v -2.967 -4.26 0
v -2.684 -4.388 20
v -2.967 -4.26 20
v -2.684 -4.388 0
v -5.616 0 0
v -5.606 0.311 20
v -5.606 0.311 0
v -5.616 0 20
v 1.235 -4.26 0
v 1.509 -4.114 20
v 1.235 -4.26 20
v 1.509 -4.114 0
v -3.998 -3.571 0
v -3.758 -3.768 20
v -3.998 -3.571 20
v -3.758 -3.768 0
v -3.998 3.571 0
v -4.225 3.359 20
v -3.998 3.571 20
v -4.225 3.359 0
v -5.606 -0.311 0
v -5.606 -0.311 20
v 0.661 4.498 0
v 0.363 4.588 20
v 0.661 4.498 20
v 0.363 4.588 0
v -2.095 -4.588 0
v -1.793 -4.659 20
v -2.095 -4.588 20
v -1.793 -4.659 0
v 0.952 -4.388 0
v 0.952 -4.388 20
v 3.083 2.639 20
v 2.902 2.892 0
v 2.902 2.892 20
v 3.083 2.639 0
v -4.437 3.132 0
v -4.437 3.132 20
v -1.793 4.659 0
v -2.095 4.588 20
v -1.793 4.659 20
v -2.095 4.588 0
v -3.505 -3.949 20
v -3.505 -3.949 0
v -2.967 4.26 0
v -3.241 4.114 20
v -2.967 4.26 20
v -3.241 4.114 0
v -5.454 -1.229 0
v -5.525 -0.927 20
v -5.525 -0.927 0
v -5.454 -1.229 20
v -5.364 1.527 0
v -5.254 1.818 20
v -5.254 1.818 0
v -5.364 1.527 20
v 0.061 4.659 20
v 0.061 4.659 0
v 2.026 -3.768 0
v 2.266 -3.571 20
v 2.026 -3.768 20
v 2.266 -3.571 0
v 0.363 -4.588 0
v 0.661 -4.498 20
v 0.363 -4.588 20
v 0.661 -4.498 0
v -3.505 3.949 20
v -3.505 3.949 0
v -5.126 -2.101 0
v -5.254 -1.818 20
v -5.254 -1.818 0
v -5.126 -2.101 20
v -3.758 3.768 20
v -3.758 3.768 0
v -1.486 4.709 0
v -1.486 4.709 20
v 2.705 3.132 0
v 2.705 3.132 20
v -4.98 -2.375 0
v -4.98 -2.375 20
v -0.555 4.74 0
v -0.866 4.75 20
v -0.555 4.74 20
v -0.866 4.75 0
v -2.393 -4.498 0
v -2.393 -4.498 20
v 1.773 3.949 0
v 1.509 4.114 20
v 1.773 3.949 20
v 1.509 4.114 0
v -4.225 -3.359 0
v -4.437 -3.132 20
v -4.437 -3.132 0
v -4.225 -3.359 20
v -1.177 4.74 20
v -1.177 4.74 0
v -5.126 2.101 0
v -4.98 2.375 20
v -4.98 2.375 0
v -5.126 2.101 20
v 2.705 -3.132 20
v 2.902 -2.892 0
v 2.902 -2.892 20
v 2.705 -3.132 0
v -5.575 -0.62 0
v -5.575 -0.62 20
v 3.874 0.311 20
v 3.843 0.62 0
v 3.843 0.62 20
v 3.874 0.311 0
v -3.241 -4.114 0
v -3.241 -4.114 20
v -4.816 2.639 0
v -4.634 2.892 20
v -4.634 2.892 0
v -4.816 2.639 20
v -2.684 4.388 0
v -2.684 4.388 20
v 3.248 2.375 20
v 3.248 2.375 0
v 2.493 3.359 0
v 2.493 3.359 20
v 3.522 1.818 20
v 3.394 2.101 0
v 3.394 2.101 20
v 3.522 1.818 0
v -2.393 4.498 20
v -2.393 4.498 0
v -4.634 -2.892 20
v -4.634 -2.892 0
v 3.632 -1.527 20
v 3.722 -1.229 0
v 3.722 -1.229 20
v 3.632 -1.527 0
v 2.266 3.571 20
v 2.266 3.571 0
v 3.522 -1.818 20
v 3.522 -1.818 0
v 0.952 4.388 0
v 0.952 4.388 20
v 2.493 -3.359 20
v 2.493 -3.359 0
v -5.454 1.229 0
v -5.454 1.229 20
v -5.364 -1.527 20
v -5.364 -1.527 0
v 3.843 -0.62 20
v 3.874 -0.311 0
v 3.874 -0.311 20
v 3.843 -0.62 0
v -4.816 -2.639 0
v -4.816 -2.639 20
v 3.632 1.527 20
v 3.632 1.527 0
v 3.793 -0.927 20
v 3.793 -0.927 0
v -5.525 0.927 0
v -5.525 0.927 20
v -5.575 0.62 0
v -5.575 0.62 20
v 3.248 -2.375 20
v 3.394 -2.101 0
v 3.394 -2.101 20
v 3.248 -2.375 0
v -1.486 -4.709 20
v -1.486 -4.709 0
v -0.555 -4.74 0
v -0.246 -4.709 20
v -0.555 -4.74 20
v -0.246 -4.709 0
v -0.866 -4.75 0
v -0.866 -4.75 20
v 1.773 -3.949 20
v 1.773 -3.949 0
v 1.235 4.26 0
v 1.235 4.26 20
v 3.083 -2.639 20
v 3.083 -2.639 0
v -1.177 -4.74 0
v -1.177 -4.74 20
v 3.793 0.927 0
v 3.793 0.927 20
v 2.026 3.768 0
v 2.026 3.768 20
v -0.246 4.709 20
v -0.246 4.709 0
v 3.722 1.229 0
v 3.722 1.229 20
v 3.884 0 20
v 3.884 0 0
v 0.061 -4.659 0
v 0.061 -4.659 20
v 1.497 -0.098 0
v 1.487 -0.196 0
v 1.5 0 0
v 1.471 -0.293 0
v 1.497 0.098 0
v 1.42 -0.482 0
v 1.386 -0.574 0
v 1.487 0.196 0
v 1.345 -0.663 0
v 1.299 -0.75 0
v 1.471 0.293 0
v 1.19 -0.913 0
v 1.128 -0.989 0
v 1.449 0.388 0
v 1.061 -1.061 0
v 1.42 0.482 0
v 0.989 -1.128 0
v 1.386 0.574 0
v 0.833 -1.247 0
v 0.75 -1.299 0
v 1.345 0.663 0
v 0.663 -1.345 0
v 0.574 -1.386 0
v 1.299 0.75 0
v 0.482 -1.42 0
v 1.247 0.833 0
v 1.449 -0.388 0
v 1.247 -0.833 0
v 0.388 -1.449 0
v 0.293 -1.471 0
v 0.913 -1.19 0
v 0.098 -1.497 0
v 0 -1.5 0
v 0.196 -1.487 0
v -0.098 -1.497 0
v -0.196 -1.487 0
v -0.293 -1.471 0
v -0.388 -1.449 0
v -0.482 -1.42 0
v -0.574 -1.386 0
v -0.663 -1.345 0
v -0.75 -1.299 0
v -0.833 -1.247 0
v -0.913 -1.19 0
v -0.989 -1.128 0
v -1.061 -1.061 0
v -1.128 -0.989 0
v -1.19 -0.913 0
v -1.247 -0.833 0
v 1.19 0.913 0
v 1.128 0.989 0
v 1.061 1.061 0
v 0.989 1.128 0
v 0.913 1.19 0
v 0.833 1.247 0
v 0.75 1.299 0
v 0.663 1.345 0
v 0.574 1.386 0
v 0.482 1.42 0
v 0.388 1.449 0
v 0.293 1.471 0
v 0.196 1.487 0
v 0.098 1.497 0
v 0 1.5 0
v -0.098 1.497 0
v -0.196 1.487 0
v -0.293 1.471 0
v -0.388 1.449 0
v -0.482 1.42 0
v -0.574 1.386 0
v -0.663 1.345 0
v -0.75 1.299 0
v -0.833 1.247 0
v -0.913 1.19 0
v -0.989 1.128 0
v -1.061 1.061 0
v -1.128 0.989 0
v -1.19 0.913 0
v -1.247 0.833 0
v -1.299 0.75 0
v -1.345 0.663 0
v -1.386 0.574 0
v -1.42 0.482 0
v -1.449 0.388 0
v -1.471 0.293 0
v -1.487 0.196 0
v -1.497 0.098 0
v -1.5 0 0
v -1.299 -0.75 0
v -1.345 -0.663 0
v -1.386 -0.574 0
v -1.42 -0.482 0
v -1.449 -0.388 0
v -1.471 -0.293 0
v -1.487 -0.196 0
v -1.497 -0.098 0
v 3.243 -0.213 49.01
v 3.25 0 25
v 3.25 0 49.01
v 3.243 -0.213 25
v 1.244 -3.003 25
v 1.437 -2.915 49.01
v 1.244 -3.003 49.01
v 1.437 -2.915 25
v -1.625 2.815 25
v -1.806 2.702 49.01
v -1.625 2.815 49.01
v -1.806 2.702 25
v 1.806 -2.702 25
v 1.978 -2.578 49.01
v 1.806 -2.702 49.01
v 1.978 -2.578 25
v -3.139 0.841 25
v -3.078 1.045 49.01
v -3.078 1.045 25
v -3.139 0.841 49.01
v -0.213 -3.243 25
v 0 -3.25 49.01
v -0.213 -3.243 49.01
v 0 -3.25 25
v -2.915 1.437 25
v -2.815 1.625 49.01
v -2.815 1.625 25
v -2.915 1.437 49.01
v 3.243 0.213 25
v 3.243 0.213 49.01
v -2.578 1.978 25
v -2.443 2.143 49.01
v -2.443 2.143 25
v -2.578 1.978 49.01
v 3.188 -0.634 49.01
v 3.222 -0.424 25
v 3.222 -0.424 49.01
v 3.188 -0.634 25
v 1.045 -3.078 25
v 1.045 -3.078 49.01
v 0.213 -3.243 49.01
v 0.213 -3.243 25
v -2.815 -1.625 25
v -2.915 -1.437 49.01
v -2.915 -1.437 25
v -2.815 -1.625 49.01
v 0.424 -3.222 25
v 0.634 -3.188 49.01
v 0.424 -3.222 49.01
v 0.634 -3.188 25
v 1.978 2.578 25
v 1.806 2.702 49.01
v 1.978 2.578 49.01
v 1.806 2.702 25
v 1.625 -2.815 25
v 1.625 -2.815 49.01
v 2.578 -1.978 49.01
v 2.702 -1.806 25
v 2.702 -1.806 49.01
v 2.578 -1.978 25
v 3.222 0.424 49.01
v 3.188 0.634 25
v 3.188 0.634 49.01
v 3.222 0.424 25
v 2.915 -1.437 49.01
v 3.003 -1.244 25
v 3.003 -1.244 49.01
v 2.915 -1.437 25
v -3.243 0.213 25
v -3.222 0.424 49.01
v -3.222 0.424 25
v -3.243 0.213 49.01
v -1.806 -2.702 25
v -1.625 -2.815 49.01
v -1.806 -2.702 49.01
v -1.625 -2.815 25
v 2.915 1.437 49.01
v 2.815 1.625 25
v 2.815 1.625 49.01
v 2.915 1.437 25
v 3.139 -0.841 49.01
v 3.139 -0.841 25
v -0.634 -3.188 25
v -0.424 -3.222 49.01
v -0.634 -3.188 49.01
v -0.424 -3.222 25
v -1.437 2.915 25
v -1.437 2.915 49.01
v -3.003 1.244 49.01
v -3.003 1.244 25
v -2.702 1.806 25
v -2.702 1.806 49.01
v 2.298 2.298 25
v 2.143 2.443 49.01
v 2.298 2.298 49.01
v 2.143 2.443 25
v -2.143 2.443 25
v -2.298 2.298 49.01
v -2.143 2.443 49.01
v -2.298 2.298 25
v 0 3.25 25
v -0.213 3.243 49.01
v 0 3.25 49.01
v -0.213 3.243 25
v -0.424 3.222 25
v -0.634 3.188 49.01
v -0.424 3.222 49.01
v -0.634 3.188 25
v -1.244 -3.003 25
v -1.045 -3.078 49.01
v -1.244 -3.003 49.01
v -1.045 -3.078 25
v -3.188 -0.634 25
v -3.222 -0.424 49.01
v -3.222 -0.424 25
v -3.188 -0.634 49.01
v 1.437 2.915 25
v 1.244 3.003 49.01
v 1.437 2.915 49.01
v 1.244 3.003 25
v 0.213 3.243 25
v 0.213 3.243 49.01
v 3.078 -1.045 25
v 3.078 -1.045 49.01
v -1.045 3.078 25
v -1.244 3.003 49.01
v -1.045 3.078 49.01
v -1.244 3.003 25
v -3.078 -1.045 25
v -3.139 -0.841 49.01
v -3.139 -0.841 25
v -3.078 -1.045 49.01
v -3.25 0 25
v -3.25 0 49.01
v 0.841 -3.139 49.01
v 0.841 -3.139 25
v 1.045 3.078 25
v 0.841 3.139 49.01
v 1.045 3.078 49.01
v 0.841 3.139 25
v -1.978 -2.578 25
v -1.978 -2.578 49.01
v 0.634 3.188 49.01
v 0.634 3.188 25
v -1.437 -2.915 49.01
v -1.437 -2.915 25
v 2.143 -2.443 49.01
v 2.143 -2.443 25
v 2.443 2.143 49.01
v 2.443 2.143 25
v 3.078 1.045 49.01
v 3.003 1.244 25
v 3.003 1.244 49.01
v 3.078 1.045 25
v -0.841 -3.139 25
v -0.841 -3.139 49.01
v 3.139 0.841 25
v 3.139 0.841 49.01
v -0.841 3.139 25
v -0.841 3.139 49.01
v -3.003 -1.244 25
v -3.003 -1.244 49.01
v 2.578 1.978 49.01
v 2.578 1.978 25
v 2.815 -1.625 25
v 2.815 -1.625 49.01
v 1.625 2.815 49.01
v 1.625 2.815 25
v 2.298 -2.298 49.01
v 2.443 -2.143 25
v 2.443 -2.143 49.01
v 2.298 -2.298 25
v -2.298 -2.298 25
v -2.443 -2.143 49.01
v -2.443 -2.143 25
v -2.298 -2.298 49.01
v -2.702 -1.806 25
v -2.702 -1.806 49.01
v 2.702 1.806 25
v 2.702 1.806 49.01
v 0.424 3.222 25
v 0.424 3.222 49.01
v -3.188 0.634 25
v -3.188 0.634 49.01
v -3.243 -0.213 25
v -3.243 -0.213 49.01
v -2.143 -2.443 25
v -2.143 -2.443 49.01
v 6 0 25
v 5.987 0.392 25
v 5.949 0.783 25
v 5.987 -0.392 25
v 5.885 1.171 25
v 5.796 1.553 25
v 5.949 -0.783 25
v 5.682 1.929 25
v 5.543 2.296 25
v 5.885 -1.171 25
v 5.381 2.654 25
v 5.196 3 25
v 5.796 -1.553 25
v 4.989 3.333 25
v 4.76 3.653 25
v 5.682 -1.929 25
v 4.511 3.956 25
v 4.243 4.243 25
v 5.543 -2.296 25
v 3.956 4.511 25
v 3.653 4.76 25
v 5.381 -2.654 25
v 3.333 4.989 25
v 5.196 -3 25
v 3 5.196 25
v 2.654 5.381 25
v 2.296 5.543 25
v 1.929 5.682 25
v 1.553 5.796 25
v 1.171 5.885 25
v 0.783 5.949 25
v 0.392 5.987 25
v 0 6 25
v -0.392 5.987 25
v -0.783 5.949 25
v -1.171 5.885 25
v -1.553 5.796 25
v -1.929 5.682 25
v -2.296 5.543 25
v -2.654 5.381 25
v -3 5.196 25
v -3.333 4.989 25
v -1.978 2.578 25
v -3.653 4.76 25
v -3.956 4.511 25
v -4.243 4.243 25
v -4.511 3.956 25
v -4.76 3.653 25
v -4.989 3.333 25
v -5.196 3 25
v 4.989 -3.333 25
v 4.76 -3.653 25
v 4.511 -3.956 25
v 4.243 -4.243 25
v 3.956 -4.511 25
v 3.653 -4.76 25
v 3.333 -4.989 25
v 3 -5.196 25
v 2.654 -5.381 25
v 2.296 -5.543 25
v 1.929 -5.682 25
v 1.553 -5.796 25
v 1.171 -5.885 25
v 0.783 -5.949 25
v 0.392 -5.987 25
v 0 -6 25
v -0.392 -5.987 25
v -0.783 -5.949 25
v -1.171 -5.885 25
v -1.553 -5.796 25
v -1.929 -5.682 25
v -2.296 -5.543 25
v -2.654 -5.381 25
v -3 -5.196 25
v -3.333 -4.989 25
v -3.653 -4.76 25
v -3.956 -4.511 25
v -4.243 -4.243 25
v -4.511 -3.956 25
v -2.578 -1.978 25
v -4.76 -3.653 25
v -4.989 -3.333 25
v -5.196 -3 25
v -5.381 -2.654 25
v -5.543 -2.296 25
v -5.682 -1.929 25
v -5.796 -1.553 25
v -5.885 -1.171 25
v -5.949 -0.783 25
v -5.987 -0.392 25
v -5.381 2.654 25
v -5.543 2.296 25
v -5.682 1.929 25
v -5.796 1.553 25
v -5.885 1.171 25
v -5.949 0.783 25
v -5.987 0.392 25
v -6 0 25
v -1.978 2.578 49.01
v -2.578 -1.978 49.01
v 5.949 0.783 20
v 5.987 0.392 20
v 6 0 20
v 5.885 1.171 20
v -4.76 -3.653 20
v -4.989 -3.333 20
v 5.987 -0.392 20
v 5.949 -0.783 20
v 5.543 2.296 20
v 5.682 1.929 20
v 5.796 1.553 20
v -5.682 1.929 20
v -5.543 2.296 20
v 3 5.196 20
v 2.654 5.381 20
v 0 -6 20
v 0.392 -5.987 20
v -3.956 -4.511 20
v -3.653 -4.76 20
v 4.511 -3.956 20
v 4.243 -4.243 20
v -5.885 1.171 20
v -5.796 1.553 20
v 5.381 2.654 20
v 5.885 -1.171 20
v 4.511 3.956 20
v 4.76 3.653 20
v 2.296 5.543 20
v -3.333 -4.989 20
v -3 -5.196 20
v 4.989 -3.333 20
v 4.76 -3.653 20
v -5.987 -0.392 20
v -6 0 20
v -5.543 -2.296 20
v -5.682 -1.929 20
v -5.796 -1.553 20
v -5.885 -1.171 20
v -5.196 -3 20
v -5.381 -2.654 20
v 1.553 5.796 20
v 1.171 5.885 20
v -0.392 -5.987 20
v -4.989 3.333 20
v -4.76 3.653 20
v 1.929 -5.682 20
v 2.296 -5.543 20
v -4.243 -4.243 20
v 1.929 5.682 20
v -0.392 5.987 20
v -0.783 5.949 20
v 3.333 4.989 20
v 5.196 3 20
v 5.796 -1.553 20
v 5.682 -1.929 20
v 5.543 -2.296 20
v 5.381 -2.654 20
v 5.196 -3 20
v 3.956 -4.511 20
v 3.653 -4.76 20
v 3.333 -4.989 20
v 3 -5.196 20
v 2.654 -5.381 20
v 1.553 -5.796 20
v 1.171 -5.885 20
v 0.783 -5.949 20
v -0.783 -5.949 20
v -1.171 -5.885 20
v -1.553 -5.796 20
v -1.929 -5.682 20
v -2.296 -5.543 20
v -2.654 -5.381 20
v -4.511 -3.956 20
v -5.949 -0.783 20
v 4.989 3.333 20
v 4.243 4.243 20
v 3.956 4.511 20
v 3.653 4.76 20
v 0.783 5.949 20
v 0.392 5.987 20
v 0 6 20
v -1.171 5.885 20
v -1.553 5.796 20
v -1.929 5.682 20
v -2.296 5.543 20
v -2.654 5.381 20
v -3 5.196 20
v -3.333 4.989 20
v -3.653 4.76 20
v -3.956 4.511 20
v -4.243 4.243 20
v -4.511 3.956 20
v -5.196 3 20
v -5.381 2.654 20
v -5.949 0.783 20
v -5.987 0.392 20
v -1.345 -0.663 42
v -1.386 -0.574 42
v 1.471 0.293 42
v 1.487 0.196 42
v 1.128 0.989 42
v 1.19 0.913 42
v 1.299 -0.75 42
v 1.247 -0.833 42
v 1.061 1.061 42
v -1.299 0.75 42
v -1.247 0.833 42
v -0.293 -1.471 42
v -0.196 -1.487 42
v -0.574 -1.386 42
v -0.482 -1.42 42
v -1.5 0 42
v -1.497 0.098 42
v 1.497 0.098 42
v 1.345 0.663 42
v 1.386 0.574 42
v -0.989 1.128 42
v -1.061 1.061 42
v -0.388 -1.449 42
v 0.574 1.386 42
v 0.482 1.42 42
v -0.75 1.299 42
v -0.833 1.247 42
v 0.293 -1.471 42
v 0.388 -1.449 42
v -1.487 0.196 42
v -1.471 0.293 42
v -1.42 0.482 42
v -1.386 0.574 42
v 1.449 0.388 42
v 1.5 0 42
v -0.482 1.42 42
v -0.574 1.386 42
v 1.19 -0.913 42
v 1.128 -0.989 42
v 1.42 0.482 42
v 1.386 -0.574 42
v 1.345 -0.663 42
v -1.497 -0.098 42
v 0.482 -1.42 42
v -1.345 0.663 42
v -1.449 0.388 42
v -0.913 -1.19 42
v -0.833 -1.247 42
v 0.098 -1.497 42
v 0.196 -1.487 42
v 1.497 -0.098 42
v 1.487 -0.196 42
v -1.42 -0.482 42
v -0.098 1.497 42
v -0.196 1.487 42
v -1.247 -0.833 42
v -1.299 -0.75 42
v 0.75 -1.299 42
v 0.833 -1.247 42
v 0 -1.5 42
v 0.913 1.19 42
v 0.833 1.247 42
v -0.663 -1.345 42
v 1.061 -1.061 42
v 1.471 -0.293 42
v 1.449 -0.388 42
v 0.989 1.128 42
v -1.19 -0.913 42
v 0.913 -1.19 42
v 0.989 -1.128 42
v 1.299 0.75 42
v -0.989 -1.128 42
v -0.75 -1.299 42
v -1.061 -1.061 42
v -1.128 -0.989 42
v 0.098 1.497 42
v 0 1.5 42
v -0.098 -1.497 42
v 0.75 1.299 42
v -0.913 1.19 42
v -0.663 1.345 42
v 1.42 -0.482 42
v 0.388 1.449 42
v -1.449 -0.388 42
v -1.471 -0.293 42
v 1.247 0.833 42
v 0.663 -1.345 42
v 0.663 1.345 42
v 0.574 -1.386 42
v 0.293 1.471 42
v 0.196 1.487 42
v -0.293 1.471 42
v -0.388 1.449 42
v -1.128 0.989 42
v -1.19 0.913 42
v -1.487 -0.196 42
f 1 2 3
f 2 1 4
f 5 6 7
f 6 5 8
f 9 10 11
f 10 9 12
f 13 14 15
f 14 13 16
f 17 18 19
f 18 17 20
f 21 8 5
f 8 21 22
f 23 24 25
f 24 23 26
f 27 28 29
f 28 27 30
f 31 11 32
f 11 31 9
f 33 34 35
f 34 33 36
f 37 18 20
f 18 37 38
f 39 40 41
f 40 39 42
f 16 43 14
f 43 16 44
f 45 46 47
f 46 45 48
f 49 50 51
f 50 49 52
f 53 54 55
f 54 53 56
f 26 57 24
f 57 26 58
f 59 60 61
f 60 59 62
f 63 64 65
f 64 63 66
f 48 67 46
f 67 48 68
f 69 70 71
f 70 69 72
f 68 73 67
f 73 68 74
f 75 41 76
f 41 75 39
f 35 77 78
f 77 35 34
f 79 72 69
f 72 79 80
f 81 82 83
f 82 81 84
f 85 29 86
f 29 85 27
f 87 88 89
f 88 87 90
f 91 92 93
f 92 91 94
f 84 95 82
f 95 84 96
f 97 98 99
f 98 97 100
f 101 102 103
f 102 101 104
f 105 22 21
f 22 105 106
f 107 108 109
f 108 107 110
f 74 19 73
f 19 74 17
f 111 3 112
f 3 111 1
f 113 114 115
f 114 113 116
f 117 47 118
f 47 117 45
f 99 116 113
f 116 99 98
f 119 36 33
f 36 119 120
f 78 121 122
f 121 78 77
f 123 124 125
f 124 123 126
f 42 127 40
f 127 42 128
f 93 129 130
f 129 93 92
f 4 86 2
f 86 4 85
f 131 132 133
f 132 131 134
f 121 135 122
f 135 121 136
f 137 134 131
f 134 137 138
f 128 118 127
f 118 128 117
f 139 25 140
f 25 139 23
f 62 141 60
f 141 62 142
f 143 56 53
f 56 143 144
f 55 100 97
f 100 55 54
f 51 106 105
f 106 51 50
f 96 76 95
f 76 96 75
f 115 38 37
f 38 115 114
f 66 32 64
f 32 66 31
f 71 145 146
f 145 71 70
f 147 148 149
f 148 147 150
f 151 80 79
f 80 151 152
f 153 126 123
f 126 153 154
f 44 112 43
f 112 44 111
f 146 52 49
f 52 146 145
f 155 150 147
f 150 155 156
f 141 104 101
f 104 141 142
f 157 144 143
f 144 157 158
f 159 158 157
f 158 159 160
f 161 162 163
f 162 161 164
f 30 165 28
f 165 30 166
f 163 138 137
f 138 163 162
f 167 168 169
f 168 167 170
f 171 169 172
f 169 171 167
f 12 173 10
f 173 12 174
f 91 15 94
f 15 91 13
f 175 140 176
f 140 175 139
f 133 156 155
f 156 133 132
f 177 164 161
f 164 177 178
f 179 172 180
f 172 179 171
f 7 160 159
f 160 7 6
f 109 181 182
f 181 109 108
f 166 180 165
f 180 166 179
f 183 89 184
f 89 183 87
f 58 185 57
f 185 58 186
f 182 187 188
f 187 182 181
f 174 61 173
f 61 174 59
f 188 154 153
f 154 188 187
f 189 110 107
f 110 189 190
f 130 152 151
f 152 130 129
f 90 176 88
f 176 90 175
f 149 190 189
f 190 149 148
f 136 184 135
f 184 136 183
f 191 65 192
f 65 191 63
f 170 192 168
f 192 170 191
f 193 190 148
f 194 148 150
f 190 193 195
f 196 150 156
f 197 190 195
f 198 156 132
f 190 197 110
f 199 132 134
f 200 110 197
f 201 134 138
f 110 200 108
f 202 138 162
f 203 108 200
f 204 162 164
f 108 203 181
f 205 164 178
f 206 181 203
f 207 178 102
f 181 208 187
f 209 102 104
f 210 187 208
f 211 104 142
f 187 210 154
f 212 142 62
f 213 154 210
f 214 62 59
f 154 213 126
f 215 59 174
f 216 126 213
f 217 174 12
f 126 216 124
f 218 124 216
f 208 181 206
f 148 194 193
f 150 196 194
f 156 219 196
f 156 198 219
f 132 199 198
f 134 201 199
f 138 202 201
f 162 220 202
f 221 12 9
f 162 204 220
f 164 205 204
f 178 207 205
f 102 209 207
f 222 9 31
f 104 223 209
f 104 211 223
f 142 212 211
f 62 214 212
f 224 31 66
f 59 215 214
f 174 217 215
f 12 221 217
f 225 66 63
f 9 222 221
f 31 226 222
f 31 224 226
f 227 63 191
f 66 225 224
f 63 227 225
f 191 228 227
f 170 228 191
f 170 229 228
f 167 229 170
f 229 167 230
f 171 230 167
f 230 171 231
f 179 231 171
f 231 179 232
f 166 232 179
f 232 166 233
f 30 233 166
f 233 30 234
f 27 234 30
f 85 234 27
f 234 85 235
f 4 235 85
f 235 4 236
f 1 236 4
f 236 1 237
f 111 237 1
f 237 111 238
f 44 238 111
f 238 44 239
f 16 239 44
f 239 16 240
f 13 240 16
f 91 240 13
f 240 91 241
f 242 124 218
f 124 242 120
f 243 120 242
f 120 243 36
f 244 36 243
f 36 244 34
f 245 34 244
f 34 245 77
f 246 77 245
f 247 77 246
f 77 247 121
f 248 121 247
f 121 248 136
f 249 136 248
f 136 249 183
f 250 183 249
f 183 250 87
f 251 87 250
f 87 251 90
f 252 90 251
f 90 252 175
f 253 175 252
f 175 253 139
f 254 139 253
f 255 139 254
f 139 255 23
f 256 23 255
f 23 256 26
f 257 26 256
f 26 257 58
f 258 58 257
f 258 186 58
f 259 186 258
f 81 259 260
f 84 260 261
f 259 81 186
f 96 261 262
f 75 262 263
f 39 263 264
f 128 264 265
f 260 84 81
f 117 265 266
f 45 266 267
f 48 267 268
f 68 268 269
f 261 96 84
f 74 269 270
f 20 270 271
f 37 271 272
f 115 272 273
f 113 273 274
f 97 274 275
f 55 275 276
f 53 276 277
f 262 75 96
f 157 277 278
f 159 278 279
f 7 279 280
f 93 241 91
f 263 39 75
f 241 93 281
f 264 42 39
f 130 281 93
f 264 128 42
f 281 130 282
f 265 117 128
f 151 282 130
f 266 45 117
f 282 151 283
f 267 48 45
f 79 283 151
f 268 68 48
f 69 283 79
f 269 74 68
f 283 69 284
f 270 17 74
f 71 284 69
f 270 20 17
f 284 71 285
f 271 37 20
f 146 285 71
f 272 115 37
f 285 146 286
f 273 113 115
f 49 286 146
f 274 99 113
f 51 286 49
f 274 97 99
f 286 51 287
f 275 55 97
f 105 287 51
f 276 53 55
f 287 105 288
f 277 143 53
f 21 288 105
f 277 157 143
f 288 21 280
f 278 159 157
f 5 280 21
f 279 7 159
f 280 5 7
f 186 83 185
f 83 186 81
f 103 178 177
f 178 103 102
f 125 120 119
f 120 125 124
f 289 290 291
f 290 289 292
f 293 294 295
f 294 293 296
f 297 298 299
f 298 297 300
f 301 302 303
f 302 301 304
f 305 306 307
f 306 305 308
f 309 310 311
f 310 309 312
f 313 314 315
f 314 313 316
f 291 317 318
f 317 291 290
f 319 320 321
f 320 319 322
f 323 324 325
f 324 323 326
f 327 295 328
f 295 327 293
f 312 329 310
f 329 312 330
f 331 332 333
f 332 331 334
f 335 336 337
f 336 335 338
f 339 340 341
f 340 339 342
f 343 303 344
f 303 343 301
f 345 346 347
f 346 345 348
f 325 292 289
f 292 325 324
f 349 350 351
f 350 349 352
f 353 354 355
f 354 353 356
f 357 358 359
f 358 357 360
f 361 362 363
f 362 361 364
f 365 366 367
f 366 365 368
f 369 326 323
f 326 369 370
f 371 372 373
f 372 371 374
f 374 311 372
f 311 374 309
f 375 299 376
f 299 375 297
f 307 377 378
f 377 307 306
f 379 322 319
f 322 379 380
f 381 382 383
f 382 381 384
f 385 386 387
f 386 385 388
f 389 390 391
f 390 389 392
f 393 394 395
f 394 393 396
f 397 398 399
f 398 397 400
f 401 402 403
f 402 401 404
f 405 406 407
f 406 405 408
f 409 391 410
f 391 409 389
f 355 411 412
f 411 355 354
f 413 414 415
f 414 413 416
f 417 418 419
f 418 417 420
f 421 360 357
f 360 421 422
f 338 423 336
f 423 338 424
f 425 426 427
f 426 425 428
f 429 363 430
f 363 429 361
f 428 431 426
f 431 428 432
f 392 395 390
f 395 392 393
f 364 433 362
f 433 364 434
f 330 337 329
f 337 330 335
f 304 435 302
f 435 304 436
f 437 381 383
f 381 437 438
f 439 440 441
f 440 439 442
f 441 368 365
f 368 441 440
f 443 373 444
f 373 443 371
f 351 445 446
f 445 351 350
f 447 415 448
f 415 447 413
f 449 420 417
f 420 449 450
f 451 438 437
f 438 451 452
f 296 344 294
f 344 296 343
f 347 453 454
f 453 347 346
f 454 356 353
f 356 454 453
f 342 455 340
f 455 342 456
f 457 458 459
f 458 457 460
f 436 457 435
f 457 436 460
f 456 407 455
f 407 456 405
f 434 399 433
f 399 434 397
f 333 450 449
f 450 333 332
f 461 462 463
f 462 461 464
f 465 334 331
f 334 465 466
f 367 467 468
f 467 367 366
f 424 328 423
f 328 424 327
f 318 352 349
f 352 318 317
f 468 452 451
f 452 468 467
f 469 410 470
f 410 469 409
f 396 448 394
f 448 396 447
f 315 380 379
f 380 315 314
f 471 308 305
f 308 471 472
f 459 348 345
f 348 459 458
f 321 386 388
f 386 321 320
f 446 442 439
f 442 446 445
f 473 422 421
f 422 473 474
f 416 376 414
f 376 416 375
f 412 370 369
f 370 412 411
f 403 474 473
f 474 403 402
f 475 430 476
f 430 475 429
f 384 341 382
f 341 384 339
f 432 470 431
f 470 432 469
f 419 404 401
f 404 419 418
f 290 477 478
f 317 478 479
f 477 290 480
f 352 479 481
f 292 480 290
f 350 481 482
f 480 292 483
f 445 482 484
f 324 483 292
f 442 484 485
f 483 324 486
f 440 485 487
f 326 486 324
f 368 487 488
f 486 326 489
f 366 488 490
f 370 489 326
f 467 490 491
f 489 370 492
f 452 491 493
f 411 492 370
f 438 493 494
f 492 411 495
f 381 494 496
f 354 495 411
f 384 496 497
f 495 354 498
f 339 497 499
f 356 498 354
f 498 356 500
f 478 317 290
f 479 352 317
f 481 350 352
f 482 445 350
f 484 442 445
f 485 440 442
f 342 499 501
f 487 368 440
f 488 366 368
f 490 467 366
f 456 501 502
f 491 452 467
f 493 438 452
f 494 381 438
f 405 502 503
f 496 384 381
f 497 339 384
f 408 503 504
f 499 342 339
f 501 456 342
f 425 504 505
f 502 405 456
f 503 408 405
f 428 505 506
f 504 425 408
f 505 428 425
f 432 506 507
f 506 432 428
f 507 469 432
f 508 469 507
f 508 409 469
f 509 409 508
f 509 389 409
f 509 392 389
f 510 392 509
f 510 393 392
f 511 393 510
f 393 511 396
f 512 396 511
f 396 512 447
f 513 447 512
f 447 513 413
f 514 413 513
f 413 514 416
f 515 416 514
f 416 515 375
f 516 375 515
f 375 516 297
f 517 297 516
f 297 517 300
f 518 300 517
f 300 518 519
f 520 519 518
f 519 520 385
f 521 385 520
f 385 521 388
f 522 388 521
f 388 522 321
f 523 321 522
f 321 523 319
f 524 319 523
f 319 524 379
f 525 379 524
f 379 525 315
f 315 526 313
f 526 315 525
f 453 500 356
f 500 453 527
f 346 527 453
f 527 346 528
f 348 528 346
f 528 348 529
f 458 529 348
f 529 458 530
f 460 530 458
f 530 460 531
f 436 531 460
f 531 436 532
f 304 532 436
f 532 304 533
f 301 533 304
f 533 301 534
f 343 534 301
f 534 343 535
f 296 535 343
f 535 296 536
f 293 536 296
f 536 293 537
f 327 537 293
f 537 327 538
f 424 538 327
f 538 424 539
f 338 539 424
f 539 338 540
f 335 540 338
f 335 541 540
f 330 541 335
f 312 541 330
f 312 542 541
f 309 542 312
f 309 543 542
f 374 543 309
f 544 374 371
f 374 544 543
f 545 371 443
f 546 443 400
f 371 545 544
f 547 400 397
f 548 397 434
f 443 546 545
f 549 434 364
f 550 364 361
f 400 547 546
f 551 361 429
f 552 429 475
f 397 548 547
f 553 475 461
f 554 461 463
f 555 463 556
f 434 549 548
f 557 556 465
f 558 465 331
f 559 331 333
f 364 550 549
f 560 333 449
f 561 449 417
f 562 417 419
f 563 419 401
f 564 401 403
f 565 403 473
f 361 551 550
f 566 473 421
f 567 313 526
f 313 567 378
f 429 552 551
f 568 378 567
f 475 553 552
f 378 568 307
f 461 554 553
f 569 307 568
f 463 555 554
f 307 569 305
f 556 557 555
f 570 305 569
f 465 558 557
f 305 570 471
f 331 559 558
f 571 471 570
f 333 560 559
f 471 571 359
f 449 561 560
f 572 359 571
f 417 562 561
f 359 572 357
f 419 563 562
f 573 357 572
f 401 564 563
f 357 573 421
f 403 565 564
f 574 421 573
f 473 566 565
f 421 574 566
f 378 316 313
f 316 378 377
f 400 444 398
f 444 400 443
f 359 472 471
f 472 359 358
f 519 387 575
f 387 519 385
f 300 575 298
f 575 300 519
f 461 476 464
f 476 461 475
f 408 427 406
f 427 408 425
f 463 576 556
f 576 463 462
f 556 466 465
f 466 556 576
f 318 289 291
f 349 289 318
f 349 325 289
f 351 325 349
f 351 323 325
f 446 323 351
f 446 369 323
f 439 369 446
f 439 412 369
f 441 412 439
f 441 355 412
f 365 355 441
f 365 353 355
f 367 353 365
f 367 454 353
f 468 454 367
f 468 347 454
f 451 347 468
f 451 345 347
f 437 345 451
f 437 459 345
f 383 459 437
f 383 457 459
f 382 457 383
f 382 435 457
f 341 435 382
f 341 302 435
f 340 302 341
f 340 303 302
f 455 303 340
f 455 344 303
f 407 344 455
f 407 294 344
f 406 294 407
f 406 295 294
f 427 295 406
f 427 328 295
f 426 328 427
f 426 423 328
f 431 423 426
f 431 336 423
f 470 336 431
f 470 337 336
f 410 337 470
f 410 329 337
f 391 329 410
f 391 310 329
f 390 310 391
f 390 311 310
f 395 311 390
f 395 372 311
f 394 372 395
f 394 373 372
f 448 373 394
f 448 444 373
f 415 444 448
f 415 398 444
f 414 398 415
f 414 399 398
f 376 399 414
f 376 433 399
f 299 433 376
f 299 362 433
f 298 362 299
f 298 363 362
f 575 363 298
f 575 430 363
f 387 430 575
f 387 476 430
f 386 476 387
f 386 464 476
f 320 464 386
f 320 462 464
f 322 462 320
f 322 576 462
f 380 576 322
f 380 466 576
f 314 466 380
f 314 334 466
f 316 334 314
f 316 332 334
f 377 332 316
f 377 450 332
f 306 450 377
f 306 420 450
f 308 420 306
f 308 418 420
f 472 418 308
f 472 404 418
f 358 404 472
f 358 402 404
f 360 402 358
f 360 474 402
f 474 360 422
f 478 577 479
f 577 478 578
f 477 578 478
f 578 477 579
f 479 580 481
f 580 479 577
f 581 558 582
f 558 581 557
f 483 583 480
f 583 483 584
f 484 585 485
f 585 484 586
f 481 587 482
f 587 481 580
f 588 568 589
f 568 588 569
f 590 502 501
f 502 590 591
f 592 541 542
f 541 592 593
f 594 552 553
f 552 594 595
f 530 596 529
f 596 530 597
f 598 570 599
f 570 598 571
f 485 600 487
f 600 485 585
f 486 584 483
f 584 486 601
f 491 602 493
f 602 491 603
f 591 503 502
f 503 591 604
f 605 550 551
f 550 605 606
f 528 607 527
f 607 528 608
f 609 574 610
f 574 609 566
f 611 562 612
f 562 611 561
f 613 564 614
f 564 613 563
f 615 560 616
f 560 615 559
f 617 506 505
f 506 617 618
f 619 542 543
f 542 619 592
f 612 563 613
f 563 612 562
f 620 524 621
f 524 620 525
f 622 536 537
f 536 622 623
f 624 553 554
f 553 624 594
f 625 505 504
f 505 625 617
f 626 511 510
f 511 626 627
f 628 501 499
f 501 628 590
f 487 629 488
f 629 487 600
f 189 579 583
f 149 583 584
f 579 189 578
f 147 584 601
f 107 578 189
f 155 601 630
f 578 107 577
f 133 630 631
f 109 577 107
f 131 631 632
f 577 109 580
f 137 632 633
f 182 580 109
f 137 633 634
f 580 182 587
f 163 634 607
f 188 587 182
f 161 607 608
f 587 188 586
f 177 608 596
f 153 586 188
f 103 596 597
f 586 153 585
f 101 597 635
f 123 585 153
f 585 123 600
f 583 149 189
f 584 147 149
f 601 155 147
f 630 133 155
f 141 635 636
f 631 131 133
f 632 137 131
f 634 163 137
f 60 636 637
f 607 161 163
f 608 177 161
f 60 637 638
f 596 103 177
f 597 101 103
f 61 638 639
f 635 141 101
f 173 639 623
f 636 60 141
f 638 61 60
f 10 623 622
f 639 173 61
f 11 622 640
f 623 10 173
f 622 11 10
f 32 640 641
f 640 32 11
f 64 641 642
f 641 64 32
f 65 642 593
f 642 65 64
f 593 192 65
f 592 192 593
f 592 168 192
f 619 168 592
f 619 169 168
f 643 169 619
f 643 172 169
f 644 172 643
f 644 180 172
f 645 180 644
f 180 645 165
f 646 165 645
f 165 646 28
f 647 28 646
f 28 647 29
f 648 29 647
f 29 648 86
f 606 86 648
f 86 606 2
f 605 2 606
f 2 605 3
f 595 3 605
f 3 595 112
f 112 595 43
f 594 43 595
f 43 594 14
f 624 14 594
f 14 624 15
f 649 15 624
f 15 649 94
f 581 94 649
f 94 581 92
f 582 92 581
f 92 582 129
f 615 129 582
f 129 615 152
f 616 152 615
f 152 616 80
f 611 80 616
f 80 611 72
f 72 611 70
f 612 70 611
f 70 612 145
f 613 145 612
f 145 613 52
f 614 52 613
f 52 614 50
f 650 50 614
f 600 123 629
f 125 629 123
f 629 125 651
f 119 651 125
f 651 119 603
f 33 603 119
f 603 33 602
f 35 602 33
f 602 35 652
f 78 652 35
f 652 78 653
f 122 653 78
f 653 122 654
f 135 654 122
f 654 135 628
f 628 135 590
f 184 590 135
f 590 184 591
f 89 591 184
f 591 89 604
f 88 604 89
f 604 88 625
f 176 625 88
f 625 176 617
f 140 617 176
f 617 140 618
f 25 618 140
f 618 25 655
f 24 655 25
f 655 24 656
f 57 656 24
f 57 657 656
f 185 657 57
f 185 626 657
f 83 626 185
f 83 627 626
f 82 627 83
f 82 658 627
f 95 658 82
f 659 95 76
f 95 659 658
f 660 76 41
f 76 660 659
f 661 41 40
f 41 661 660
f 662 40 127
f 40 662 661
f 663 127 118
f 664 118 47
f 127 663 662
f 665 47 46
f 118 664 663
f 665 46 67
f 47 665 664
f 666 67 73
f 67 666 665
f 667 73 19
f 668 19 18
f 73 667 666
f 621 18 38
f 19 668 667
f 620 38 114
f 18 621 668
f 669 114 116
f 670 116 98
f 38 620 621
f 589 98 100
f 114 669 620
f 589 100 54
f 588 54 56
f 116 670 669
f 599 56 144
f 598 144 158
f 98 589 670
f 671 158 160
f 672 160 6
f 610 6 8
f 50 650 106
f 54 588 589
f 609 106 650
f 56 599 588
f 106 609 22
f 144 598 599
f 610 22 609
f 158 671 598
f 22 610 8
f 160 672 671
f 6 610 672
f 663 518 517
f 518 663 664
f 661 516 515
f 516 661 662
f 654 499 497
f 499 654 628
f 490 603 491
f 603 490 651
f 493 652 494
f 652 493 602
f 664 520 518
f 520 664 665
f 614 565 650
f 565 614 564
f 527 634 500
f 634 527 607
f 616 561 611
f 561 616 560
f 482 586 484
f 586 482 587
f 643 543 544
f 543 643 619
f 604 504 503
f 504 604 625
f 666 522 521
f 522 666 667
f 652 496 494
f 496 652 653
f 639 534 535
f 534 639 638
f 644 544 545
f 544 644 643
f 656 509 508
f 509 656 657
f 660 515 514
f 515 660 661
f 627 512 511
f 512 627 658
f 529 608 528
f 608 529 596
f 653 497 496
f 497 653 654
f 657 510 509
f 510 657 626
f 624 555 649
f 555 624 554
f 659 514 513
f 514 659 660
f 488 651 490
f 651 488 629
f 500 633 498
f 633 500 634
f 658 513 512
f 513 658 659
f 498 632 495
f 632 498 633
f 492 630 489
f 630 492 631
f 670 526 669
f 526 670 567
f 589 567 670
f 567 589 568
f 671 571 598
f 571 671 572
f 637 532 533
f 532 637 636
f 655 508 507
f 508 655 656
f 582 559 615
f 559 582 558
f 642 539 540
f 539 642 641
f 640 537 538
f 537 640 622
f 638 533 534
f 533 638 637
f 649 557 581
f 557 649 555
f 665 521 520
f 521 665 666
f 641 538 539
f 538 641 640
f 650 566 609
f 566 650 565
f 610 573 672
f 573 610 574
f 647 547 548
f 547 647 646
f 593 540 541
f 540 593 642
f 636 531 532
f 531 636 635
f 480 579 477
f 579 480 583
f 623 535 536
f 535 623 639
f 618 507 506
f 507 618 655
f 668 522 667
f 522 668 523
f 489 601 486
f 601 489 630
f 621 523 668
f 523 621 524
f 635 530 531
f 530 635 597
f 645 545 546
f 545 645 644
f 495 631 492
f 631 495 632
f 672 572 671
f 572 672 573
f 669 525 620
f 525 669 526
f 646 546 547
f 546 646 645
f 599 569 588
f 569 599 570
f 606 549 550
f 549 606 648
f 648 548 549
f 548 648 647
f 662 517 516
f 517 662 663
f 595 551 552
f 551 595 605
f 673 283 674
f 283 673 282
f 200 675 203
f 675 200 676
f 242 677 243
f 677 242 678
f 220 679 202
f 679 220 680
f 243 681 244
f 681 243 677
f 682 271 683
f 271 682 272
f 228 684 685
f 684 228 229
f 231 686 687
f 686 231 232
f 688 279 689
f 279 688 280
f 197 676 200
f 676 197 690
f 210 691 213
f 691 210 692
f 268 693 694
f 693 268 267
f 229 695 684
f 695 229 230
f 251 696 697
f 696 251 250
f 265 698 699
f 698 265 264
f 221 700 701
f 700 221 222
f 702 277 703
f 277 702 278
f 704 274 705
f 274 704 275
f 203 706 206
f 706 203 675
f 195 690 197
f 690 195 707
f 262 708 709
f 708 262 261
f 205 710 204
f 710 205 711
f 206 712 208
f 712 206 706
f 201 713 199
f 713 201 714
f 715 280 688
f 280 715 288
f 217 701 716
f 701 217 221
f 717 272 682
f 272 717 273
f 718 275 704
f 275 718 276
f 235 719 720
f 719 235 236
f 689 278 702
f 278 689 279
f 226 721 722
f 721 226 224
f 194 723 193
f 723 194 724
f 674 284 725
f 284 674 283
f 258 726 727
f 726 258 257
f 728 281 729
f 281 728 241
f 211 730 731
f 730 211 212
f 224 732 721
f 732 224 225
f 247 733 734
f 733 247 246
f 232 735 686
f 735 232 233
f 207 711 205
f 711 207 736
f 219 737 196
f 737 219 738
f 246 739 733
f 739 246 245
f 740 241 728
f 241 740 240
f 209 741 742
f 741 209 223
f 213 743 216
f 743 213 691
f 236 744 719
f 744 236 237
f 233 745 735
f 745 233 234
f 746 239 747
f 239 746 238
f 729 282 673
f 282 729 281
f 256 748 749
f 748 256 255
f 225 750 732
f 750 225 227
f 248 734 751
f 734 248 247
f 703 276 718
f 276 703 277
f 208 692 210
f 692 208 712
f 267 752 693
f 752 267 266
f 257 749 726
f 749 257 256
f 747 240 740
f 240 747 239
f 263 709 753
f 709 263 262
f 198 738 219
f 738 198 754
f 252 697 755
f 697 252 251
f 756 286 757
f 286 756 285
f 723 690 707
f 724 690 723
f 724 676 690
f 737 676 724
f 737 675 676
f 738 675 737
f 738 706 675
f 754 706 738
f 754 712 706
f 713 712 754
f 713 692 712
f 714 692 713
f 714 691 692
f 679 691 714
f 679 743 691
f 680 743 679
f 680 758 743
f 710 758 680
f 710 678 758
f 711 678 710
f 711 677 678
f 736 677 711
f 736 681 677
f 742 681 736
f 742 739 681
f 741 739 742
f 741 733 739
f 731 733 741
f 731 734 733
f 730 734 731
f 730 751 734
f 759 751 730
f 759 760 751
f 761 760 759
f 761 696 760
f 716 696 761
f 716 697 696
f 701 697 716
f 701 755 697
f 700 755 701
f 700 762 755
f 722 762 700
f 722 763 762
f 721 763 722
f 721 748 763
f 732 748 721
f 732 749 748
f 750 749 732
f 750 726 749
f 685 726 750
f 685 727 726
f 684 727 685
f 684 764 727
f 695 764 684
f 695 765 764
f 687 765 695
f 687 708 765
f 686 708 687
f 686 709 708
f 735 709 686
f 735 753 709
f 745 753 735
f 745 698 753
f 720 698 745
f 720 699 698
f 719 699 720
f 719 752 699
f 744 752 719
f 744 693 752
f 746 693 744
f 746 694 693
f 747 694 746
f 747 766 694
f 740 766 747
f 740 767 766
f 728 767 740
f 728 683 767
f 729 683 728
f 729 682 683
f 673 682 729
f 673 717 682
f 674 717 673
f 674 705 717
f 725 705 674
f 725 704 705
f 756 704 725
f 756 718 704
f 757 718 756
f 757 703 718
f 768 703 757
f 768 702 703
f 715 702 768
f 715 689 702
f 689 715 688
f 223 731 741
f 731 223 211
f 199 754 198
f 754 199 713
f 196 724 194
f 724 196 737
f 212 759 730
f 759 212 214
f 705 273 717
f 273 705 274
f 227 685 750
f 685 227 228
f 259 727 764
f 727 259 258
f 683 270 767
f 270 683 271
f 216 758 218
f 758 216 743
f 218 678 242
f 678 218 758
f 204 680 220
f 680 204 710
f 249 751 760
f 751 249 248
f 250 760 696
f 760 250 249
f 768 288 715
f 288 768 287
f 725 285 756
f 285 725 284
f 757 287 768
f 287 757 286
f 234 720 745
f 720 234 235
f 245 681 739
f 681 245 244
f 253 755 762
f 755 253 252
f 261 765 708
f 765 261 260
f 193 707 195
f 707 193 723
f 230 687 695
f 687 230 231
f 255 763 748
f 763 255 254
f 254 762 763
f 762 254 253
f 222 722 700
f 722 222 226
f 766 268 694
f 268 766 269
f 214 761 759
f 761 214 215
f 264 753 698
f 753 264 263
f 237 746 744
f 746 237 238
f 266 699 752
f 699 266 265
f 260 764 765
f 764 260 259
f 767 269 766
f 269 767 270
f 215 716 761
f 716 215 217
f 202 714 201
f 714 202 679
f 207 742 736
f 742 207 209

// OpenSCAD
// Hose-barb reducer: joins 8 mm ID tubing to 5 mm ID tubing
// Print orientation: standing upright along Z

$fn = 96;

// ---- 8 mm tubing barbs (z = 0 to 20) ----
barb_h_8 = 20;
barb_od_bottom_8 = 7.5;
barb_od_top_8 = 9.5;

// ---- 5 mm tubing barbs (z = 25 to 41) ----
barb_h_5 = 16;
barb_od_bottom_5 = 6.5;
barb_od_top_5 = 5.0;

// ---- Collar (z = 20 to 25) ----
collar_od = 12;

// ---- Through bore ----
bore = 3;

// ---- Derived ----
collar_h = 5;
overlap = 0.01;

module barb(h, od_bottom, od_top) {
    // Sawtooth profile: grow linearly, then step straight back to bottom diameter
    len = (od_top - od_bottom) / 2 / tan(30);  // 30 deg flank
    hull() {
        translate([0, 0, 0]) cylinder(h = h + overlap, d = od_bottom);
        translate([0, 0, h - overlap]) cylinder(h = overlap, d = od_bottom);
        for (s = [-1, 1])
            rotate([0, 0, s * 180])
                translate([len / 2, 0, 0])
                    linear_extrude(height = h + overlap)
                        circle(d = od_top);
    }
}

difference() {
    union() {
        // 8 mm barbs
        for (z = [0, barb_h_8 / 2])
            translate([0, 0, z]) barb(h = barb_h_8 / 2 + overlap, od_bottom = barb_od_bottom_8, od_top = barb_od_top_8);

        // Collar
        translate([0, 0, 20]) cylinder(h = collar_h, d = collar_od);

        // 5 mm barbs
        for (z = [25, 41 - 16 / 2])
            translate([0, 0, z]) barb(h = barb_h_5, od_bottom = barb_od_bottom_5, od_top = barb_od_top_5);
    }

    // Through bore
    translate([0, 0, -1]) cylinder(h = barb_h_8 + collar_h + barb_h_5 + 2, d = bore);
}
